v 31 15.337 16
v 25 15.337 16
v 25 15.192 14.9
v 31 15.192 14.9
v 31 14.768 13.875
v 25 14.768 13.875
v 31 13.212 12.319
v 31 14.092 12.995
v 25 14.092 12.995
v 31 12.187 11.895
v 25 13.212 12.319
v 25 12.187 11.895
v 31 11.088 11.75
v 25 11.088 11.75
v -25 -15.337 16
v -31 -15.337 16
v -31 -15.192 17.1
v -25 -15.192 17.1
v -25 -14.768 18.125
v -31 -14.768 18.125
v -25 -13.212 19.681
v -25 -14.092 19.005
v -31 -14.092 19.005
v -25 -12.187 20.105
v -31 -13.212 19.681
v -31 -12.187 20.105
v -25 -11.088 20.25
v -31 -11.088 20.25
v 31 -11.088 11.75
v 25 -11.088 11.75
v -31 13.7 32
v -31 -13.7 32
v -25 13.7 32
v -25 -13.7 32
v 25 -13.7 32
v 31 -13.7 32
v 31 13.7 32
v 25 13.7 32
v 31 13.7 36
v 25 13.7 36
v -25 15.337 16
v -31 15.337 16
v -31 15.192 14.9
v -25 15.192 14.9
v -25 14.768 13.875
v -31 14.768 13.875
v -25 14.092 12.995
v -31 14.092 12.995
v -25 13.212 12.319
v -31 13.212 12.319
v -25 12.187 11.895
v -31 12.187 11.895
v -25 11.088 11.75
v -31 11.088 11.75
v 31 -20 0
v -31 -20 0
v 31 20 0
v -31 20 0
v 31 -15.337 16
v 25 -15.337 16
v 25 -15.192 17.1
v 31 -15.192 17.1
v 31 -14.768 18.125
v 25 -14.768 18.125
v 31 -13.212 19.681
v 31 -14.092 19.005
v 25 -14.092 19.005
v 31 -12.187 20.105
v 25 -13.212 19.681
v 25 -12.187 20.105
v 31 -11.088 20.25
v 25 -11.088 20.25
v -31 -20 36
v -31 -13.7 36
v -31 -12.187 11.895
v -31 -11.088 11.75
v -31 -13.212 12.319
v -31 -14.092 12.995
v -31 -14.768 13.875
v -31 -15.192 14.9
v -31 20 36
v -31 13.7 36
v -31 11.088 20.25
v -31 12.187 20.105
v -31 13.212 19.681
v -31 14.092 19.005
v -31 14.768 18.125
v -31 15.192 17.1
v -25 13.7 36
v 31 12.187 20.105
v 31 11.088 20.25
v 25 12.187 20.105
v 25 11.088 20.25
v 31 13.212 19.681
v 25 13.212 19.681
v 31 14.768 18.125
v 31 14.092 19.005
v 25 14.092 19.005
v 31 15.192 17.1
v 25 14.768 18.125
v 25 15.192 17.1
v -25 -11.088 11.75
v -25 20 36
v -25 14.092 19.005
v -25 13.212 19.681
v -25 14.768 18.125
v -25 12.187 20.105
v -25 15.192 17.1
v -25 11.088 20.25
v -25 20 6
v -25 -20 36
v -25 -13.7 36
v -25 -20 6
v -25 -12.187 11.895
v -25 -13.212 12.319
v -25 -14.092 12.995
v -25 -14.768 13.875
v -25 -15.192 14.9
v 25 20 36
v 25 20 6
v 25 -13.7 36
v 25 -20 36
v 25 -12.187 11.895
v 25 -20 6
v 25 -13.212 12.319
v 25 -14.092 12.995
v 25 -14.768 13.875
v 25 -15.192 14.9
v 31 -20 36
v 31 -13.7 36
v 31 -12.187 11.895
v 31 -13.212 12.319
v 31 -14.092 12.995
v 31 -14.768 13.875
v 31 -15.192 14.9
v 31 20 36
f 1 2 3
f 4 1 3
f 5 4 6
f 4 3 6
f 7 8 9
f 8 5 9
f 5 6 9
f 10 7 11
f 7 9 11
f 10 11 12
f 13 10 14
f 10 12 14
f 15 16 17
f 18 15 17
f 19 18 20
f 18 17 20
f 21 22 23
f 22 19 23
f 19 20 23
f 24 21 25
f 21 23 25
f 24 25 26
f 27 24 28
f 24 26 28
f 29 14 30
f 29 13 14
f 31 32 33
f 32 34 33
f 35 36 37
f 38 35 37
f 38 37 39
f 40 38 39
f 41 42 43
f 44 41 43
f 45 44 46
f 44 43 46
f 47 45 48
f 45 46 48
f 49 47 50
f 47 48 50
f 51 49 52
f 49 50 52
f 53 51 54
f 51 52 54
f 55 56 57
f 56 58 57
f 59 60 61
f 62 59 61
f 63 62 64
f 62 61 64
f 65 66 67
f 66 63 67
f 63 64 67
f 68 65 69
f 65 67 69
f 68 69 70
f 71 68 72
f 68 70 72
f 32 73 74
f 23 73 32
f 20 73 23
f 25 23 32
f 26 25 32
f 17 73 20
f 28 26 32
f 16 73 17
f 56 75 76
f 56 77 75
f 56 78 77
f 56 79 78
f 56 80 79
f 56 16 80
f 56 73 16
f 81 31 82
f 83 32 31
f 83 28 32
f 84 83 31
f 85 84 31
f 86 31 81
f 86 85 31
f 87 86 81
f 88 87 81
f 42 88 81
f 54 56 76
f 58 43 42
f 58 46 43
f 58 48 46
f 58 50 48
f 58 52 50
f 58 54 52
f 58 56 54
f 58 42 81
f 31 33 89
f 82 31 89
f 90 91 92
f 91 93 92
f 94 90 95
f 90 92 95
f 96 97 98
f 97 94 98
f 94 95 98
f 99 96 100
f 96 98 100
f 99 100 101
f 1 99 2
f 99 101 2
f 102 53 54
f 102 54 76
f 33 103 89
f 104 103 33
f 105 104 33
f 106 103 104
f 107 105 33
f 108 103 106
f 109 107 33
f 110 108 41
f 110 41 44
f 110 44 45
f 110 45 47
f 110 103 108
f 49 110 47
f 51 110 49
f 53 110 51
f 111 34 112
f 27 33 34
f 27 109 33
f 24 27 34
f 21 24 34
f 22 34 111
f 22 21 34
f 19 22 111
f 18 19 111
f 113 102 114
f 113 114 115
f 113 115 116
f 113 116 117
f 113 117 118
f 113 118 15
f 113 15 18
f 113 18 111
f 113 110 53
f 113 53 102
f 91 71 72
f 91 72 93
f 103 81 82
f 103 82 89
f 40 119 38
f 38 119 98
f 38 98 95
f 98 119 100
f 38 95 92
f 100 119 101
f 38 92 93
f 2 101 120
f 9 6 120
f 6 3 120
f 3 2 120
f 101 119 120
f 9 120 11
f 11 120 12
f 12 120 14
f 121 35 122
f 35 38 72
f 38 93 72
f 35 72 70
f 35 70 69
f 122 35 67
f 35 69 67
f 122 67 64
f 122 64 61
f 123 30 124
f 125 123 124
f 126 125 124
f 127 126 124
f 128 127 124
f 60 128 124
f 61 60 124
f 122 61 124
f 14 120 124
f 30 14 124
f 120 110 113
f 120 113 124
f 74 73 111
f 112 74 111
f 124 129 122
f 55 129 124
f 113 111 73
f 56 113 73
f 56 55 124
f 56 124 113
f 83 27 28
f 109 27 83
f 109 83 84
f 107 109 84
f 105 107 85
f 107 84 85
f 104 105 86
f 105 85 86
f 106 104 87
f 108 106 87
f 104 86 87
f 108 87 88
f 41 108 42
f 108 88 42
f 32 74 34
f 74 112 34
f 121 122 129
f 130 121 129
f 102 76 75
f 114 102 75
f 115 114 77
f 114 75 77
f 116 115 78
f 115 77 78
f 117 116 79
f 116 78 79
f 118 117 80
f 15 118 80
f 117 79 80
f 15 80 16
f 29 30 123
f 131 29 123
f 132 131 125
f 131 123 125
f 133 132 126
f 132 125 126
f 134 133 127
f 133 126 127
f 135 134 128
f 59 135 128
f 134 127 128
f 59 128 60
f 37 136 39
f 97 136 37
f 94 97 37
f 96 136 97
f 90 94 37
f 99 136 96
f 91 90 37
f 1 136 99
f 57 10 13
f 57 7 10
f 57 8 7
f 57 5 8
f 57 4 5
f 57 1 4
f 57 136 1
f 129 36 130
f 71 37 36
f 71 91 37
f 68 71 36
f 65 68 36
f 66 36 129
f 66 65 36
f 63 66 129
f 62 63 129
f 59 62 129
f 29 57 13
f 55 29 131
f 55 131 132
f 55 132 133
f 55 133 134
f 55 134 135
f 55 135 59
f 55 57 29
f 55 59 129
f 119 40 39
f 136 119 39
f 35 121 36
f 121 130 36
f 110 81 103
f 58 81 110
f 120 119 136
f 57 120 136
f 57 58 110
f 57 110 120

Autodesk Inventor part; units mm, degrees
ref_plane "YZ Plane" through (0, 0, 0) normal (1, 0, 0) x (0, 1, 0)
ref_plane "XZ Plane" through (0, 0, 0) normal (0, 1, 0) x (-1, 0, 0)
ref_plane "XY Plane" through (0, 0, 0) normal (0, 0, 1) x (1, 0, 0)
sketch "スケッチ1" plane through (0, 0, 0) normal (0, 0, 1) x (1, 0, 0)
  line L0 (-31, 20) -> (31, 20)
  line L1 (31, 20) -> (31, -20)
  line L2 (31, -20) -> (-31, -20)
  line L3 (-31, -20) -> (-31, 20)
  line L4 (-31, 20) -> (31, -20) construction
  line L5 (31, 20) -> (-31, -20) construction
  point P0 (0, 0)
  dimension "d0" = 62
  dimension "d1" = 40
extrude "押し出し1" add sketch "スケッチ1" along normal blind 6
sketch "スケッチ2" plane through (0, 0, 6) normal (0, 0, 1) x (1, 0, 0)
  line L0 (31, 20) -> (-31, 20) projected
  line L1 (-31, -20) -> (31, -20) projected
  line L2 (-31, 20) -> (-25, 20)
  line L3 (-25, 20) -> (-25, -20)
  line L4 (-25, -20) -> (-31, -20)
  line L5 (-31, -20) -> (-31, 20)
  line L6 (31, -20) -> (31, 20) projected
  line L7 (31, 20) -> (25, 20)
  line L8 (25, 20) -> (25, -20)
  line L9 (25, -20) -> (31, -20)
  line L10 (31, -20) -> (31, 20)
  point P0 (0, 0)
  dimension "d4" = 6
  dimension "d5" = 6
extrude "押し出し2" add sketch "スケッチ2" along normal blind 30 contours L6 L1 L8 L0 | L3 L1 L5 L0
sketch "スケッチ3" plane through (31, -20, 0) normal (1, 0, 0) x (0, 0, -1)
  line L0 (-6, 0) -> (-36, 0) projected
  line L1 (-18.303, 0) -> (-8.303, 0)
  line L2 (0, 0) -> (0, 40) projected
  line L3 (-36, 0) -> (-36, 40) projected
  line L4 (-36, 0) -> (-17.2102, 0)
  line L5 (0, 0) -> (-16, 0)
  line L6 (-16, 0) -> (-16, 20)
  line L7 (-16, 20) -> (0, 20)
  line L8 (0, 20) -> (0, 0)
  line L9 (-20.25, 35.337) -> (-11.75, 35.337)
  line L10 (-11.75, 35.337) -> (-11.75, 4.663)
  line L11 (-11.75, 4.663) -> (-20.25, 4.663)
  line L12 (-20.25, 4.663) -> (-20.25, 35.337)
  line L13 (-20.25, 35.337) -> (-11.75, 4.663) construction
  line L14 (-11.75, 35.337) -> (-20.25, 4.663) construction
  line L15 (-40, 6.3) -> (-32, 6.3)
  line L16 (-32, 6.3) -> (-32, 33.7)
  line L17 (-32, 33.7) -> (-40, 33.7)
  line L18 (-40, 33.7) -> (-40, 6.3)
  line L19 (-40, 6.3) -> (-32, 33.7) construction
  line L20 (-32, 6.3) -> (-40, 33.7) construction
  point P0 (0, 20)
  point P1 (-36, 20)
  point P2 (-36, 33.7)
  point P3 (-36, 6.3)
  dimension "d9" = 36
  dimension "d10" = 40
  dimension "d11" = 20
  dimension "d12" = 16
  dimension "d13" = 8.5
  dimension "d17" = 8
  dimension "d18" = 27.4
extrude "押し出し3" cut sketch "スケッチ3" against normal blind 100 contours L3 L17 L16 L15 | L11 L12 L9 L10 L7 L6 | L6 L7 L10 L11
fillet "フィレット1" radius 4.25 8 edges at (28, 15.337, 11.75) (28, 15.337, 20.25) (28, -15.337, 11.75) (28, -15.337, 20.25) (-28, 15.337, 11.75) (-28, 15.337, 20.25) (-28, -15.337, 11.75) (-28, -15.337, 20.25)
equation "\"d5\" = d4"
equation "\"d11\" = 0.5 * d10"
properties part number "main"
